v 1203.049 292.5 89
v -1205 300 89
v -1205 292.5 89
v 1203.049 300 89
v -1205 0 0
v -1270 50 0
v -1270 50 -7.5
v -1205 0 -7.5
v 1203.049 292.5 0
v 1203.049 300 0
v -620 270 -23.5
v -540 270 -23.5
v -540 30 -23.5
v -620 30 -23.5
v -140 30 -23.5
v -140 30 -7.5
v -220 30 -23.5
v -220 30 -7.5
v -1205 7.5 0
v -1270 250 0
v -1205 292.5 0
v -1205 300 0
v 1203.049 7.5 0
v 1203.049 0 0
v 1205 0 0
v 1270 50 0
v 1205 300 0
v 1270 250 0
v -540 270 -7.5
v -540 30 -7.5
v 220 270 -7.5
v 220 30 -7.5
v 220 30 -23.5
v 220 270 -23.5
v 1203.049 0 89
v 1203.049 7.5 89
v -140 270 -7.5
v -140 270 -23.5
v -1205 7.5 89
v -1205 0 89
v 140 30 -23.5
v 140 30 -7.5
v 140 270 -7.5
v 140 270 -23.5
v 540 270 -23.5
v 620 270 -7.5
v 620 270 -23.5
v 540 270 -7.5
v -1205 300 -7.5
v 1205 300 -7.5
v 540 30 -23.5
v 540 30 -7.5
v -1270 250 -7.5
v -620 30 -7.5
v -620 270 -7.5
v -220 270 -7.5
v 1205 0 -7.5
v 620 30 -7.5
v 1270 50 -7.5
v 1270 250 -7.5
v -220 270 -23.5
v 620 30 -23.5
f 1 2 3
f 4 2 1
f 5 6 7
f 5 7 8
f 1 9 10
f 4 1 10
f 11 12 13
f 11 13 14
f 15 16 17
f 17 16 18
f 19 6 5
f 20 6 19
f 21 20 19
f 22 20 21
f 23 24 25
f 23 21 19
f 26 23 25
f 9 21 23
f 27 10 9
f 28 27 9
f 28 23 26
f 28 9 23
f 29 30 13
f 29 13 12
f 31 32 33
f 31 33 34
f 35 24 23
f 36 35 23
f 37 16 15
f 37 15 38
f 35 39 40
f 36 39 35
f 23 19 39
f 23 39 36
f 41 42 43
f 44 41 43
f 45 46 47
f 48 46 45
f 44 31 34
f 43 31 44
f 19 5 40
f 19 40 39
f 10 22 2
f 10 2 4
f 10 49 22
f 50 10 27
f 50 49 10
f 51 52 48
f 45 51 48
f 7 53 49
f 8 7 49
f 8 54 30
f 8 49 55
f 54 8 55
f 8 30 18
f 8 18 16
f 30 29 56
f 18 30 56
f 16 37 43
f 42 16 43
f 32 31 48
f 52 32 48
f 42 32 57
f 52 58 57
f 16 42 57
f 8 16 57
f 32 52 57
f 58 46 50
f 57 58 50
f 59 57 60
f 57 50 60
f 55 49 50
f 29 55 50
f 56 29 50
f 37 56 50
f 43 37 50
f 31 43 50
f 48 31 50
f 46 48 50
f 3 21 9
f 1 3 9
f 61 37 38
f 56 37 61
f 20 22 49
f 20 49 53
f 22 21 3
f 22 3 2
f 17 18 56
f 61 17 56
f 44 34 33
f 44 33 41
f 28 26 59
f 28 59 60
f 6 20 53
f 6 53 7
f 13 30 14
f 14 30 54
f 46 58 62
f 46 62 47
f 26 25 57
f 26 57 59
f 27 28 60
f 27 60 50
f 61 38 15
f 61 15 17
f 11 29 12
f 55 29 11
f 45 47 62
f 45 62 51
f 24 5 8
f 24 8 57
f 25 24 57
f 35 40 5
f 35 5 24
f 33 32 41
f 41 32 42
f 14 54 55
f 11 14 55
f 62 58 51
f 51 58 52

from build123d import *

# Parameters (mm, degrees)
EXTRUDE_589_DEPTH = 7.5
SKETCH_2_W        = 2408.049034164
SKETCH_2_H        = 7.5
EXTRUDE_1_DEPTH   = 89
SKETCH_3_W        = 80
SKETCH_3_H        = 240
EXTRUDE_2_DEPTH   = 16


with BuildPart() as part:
    # 草图1 → Extrude 589 (new body)
    with BuildSketch(Plane.XY):
        Polygon((-1205, 0), (1205, 0), (1270, 50), (1270, 250), (1205, 300), (-1205, 300), (-1270, 250), (-1270, 50), align=None)
    extrude(amount=-EXTRUDE_589_DEPTH)

    # 草图2 → 凸台-拉伸1 (add)
    with BuildSketch(Plane.XY):
        with Locations((-0.975482918, 296.25)):
            Rectangle(SKETCH_2_W, SKETCH_2_H)
        with Locations((-0.975482918, 3.75)):
            Rectangle(SKETCH_2_W, SKETCH_2_H)
    extrude(amount=EXTRUDE_1_DEPTH)

    # 草图3 → 凸台-拉伸2 (add)
    with BuildSketch(Plane(origin=(0, 0, -7.5), x_dir=(-1, 0, 0), z_dir=(0, 0, -1))):
        with Locations((-580, 150)):
            Rectangle(SKETCH_3_W, SKETCH_3_H)
        with Locations((-180, 150)):
            Rectangle(SKETCH_3_W, SKETCH_3_H)
        with Locations((180, 150)):
            Rectangle(SKETCH_3_W, SKETCH_3_H)
        with Locations((580, 150)):
            Rectangle(SKETCH_3_W, SKETCH_3_H)
    extrude(amount=EXTRUDE_2_DEPTH)


solid = part.part
